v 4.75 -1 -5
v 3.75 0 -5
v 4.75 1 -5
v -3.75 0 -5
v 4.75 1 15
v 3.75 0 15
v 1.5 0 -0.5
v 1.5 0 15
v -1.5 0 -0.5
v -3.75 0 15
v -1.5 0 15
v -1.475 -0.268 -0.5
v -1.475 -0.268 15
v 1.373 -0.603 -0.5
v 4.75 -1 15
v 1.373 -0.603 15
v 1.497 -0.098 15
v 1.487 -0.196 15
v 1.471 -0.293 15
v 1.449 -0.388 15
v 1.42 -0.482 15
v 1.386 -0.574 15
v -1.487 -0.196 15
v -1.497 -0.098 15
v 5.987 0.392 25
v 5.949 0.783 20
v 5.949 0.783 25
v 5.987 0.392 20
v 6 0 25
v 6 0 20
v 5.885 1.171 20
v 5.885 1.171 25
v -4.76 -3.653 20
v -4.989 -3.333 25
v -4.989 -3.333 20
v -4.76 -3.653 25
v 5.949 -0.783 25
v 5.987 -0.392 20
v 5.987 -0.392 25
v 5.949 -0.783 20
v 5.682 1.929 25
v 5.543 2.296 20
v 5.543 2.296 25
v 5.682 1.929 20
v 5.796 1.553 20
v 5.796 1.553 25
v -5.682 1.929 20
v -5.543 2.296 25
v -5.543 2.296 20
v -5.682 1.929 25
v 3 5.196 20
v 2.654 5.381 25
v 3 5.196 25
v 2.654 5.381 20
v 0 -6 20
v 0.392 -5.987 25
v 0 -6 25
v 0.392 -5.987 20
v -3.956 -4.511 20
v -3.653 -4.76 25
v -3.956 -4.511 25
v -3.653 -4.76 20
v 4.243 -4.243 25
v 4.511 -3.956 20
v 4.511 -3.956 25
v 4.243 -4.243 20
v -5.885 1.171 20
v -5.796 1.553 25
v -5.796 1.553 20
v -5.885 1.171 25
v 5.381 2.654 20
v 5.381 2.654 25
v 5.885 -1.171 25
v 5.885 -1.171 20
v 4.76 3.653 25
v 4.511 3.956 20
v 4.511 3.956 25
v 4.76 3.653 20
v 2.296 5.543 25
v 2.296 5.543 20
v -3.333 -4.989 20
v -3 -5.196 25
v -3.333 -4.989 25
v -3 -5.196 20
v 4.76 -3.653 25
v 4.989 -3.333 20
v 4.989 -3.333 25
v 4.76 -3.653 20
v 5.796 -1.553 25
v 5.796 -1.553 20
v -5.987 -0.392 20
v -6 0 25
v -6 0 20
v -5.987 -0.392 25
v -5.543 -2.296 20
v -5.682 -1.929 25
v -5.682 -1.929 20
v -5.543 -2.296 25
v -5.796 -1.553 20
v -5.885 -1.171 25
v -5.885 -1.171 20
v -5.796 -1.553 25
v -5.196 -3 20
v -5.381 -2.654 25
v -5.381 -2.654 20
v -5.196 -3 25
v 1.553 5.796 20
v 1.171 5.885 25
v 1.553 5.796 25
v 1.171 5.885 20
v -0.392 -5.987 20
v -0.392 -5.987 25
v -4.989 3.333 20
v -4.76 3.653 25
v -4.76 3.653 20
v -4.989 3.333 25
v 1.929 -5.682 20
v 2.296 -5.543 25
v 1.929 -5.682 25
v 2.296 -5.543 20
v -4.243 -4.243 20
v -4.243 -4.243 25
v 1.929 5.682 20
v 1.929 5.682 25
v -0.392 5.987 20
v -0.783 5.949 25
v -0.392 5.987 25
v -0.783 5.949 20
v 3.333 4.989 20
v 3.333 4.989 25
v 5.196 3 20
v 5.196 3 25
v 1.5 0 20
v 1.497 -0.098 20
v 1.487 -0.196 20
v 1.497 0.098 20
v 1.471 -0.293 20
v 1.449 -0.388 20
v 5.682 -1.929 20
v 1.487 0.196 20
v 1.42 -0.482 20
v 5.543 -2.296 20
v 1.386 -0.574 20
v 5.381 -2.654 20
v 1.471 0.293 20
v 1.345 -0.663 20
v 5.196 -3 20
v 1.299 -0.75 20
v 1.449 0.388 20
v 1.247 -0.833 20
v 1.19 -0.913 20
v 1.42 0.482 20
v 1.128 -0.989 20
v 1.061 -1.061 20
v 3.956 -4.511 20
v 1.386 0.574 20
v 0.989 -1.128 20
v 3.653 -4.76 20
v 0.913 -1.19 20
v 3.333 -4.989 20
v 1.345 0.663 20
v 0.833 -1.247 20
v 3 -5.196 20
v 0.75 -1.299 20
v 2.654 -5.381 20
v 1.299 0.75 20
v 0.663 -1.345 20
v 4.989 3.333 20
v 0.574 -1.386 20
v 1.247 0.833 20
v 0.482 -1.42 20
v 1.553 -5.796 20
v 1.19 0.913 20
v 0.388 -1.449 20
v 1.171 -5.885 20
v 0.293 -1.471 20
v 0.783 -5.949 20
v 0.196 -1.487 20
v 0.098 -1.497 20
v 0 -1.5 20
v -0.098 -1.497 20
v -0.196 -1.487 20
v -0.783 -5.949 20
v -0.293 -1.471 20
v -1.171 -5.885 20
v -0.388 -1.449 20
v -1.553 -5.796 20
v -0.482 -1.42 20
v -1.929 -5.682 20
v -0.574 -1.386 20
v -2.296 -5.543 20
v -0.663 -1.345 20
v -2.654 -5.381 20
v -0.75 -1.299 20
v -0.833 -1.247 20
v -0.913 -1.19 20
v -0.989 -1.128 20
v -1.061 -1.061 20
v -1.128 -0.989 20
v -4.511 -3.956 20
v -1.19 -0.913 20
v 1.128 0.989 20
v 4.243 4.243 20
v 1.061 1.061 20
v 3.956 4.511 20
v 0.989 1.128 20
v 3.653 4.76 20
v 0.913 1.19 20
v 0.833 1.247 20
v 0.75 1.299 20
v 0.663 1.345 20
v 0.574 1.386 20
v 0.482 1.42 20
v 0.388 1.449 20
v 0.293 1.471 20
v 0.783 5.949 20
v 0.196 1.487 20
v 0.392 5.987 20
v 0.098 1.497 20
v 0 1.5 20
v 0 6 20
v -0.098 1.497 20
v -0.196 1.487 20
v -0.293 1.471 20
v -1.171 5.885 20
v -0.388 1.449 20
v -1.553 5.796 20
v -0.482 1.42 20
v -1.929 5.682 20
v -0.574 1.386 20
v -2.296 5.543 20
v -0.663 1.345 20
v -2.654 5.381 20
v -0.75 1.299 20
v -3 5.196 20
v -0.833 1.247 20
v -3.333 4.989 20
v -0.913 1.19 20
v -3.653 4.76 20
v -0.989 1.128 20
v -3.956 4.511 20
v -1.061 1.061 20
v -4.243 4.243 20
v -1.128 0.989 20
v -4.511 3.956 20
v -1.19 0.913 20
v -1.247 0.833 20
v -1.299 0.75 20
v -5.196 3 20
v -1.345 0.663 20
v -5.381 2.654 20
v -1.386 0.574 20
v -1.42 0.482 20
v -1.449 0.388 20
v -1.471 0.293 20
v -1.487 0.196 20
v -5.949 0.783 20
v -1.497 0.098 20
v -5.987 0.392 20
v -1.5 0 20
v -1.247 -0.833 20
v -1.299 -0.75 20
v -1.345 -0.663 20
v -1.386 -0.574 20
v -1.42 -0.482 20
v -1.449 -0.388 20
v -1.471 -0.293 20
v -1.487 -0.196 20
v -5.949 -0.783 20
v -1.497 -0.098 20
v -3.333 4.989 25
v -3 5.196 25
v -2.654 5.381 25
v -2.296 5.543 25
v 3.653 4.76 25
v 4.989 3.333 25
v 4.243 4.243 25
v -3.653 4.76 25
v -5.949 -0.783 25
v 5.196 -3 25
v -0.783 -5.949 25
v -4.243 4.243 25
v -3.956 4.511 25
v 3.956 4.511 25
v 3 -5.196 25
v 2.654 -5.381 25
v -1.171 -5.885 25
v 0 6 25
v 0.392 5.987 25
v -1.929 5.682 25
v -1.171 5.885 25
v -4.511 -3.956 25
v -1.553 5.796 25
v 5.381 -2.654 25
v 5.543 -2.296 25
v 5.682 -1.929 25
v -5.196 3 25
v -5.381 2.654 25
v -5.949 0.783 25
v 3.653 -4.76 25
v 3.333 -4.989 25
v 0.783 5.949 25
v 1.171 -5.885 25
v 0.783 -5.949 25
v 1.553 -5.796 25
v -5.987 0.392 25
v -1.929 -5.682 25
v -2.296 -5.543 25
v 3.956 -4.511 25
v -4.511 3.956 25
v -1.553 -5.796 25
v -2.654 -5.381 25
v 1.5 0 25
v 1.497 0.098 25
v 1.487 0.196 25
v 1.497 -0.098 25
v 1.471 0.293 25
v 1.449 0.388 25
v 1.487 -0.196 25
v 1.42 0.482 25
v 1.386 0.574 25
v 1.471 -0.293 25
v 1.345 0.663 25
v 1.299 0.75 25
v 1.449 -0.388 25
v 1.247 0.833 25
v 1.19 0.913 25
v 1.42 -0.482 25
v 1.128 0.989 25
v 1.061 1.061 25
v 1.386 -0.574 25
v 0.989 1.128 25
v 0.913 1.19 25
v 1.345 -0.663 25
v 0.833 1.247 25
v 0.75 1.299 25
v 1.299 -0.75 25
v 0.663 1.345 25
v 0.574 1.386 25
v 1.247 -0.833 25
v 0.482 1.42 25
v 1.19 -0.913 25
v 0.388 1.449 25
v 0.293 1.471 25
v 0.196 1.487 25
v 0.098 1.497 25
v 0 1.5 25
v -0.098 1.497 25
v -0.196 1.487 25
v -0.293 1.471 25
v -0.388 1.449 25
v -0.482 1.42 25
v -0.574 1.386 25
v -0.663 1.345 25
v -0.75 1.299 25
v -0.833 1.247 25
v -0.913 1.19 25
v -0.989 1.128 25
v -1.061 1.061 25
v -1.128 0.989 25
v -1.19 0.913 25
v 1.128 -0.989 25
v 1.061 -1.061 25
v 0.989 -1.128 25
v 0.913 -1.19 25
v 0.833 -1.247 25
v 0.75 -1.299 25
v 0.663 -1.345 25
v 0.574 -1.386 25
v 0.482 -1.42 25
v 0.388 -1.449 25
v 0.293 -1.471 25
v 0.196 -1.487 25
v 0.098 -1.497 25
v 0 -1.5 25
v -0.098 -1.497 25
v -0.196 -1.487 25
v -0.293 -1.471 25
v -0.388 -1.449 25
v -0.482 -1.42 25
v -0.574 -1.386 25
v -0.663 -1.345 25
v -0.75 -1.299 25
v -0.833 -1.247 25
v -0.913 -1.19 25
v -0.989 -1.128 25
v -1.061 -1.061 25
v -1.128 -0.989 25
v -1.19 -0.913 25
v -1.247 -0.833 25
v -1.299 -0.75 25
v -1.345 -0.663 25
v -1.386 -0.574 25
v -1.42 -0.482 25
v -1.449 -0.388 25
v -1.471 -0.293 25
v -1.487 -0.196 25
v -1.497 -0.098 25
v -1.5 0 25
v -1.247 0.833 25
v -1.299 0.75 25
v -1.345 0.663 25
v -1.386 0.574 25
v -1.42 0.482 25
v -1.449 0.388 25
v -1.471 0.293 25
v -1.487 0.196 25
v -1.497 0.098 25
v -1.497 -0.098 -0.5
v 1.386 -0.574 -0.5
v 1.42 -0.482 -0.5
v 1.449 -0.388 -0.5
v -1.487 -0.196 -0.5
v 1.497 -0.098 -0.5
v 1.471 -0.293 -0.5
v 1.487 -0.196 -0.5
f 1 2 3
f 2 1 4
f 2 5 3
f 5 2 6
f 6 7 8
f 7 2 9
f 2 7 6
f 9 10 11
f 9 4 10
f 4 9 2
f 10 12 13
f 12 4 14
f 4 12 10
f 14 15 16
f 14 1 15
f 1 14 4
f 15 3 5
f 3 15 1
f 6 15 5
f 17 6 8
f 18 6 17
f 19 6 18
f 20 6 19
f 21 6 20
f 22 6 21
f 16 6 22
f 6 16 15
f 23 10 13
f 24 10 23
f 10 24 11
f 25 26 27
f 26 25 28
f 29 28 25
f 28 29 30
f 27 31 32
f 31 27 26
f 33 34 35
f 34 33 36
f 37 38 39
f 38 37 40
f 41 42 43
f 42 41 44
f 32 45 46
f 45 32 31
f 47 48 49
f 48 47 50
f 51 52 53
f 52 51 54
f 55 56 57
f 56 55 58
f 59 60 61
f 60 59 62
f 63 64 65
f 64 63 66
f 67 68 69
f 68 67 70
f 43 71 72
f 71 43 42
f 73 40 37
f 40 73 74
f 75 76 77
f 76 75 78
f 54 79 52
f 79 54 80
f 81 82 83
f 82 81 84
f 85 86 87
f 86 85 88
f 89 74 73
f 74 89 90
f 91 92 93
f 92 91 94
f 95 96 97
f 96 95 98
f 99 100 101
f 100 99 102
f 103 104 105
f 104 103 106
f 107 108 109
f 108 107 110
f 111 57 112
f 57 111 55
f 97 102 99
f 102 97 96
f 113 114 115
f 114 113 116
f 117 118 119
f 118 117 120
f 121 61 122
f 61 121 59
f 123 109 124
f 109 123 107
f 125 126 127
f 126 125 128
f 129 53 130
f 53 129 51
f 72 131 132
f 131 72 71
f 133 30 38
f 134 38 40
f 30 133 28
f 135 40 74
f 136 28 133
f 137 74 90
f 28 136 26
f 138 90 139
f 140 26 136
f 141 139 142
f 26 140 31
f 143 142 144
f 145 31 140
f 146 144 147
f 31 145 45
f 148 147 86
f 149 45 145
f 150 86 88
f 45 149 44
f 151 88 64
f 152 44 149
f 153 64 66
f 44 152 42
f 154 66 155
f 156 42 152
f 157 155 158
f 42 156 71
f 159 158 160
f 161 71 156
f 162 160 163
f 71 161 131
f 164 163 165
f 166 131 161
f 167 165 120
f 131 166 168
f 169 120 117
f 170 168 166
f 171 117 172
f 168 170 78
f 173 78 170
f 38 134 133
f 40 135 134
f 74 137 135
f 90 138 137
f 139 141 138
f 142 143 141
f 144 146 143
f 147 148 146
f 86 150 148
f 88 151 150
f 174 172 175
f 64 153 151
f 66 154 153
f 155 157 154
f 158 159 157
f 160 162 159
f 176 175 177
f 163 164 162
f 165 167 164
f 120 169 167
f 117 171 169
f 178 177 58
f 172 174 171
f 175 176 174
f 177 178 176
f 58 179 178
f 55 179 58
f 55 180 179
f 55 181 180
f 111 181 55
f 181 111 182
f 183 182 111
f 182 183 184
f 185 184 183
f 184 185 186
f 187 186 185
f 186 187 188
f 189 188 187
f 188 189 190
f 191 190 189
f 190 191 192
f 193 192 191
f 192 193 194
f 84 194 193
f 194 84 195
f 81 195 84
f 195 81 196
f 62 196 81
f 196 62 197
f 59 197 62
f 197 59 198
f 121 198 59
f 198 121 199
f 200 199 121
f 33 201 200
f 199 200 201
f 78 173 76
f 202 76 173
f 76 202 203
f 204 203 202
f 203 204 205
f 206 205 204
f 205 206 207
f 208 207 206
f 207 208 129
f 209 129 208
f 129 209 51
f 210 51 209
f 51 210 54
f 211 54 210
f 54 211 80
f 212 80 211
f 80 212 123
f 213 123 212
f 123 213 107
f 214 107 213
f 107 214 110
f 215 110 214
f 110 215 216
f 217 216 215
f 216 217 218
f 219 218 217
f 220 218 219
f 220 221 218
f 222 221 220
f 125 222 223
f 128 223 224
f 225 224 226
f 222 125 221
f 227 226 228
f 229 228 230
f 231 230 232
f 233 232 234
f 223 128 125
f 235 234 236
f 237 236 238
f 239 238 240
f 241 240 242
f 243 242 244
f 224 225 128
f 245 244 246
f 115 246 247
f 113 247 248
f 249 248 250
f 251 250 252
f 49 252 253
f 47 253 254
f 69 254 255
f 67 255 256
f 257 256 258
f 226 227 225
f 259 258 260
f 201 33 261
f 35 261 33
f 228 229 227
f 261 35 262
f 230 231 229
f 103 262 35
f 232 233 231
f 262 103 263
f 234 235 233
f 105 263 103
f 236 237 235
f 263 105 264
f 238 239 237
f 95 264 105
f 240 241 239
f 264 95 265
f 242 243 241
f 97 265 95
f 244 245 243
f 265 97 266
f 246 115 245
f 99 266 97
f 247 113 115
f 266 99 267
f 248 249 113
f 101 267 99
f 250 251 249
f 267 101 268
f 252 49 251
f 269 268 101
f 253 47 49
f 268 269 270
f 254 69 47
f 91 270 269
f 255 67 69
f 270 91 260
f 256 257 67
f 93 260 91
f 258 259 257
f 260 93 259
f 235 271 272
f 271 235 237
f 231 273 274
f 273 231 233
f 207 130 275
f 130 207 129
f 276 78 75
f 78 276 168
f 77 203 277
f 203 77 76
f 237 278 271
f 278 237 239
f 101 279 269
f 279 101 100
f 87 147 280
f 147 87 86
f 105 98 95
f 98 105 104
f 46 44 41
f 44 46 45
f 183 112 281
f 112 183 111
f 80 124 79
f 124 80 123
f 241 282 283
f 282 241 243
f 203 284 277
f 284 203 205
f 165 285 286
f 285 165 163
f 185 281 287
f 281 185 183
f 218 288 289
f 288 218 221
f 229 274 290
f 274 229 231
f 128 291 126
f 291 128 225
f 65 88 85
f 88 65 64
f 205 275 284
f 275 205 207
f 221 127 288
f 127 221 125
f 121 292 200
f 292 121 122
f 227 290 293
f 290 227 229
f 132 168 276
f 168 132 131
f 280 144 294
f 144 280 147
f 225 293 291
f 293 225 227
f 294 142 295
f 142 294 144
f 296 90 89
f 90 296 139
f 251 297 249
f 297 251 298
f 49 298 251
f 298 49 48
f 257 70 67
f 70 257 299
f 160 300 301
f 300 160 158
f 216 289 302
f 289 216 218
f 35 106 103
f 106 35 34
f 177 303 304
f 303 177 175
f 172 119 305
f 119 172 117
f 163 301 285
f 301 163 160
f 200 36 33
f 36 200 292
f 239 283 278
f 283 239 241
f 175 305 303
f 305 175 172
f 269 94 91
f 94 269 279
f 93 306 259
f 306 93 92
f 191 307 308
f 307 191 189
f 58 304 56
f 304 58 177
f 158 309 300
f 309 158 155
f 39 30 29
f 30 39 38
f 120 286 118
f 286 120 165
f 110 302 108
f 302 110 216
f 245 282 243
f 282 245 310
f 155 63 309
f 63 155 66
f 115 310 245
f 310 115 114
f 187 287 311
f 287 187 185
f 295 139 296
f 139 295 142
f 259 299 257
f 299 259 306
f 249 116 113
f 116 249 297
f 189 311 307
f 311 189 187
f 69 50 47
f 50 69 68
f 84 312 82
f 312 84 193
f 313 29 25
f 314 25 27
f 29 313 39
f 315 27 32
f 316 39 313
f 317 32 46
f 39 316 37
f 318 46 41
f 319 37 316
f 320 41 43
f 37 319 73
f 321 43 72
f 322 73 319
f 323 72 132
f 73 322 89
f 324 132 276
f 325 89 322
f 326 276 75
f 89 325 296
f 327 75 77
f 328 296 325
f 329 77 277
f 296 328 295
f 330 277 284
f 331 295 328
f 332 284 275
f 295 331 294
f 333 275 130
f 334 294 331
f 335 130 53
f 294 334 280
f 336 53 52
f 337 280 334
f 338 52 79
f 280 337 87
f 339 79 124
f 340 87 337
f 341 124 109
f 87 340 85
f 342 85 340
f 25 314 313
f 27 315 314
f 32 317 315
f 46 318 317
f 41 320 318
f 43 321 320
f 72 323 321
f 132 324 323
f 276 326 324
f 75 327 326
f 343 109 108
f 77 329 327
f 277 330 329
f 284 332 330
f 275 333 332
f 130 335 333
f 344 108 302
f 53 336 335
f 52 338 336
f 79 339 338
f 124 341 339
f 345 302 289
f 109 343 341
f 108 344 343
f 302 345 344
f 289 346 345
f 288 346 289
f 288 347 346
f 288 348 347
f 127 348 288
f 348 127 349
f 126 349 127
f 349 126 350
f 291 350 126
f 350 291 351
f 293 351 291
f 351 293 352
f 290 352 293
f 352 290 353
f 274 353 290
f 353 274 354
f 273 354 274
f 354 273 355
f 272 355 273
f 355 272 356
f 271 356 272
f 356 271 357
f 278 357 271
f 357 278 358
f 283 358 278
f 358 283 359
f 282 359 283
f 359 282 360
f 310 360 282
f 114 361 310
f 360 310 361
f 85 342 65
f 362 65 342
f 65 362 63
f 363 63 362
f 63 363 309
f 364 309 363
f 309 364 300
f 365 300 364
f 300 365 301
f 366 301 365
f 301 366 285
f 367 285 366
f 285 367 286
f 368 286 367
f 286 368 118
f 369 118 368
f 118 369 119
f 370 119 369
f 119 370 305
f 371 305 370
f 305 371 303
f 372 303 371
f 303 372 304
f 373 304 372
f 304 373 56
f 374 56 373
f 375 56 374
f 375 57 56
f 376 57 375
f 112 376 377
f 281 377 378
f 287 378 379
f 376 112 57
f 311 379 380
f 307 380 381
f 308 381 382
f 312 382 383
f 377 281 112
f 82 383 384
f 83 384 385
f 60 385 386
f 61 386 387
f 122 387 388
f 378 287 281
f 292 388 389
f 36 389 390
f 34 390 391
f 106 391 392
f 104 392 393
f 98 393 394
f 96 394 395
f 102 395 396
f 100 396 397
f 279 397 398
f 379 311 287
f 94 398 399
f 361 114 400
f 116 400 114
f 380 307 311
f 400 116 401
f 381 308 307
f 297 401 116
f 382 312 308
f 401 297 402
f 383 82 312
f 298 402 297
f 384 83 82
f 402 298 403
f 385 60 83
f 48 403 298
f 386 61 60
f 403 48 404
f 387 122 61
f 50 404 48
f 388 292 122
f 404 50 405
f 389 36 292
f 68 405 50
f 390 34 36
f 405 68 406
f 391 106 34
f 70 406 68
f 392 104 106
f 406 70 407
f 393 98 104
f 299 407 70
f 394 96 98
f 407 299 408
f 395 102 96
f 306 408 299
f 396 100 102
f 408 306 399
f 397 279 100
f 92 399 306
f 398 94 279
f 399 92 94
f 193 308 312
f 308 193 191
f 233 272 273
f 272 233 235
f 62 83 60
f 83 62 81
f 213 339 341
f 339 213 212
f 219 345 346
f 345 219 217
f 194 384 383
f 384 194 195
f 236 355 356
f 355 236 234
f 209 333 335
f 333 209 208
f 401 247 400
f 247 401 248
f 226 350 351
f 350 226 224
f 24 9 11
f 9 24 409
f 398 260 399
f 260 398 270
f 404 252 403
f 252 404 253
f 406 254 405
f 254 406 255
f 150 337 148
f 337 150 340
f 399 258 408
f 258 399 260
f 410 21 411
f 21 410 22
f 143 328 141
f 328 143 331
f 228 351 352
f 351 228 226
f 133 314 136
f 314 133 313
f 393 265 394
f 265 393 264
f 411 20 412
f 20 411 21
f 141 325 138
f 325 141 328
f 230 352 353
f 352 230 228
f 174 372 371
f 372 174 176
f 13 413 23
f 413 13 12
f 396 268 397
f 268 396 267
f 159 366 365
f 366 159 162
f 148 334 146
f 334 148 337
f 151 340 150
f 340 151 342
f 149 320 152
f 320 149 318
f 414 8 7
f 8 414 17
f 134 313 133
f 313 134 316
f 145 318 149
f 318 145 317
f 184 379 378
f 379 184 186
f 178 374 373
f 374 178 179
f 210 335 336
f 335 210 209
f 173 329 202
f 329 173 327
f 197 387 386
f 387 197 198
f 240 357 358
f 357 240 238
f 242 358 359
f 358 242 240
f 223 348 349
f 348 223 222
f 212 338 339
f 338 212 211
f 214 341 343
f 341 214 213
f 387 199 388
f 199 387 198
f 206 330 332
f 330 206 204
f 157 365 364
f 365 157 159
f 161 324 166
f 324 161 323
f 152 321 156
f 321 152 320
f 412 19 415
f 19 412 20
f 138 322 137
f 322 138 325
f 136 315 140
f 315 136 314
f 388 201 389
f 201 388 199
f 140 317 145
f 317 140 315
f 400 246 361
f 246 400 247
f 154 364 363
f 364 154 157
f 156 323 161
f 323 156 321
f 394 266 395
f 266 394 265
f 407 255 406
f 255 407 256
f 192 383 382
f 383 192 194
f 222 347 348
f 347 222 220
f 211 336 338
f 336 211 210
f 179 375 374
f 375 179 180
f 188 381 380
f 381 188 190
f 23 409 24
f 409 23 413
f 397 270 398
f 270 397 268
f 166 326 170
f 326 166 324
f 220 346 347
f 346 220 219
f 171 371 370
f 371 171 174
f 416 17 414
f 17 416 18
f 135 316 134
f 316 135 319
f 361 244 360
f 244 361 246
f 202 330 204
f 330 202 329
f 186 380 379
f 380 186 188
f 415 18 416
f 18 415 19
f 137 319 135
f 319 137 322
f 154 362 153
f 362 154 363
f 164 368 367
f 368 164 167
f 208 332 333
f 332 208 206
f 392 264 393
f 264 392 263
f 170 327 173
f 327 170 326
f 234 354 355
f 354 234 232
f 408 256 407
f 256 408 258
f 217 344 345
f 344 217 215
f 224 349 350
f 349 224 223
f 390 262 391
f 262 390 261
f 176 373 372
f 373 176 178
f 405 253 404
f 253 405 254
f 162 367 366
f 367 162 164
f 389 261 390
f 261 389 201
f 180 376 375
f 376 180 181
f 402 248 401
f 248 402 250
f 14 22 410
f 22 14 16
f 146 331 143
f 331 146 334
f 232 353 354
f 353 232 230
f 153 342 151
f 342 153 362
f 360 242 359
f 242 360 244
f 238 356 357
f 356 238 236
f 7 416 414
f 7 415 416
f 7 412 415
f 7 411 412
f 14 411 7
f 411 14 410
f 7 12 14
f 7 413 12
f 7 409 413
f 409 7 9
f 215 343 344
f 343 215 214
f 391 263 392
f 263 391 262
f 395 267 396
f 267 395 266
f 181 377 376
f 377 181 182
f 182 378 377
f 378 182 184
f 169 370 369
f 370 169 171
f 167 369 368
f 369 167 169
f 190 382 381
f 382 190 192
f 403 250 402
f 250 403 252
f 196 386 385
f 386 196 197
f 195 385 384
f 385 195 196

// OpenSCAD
// Hose-barb reducer: joins 8 mm and 5 mm silicone tubing
// Print orientation: standing upright along +Z

// ---------- Parameters ----------
t8_d      = 8;     // 8 mm tubing inner diameter
t5_d      = 5;     // 5 mm tubing inner diameter
bore_d    = 3;     // through-bore diameter
z0        = 0;     // start of 8 mm section
z1        = 20;    // start of collar
z2        = 25;    // start of 5 mm section
z3        = 41;    // end of part
barb_h8   = 10;    // 8 mm barb height
barb_h5   = 8;     // 5 mm barb height
od8_bot   = 7.5;   // 8 mm barb outer diameter at bottom
od8_top   = 9.5;   // 8 mm barb outer diameter at top
od5_bot   = 6.5;   // 5 mm barb outer diameter at bottom
od5_top   = 5.0;   // 5 mm barb outer diameter at top
collar_d  = 12;    // collar diameter
eps       = 0.5;   // cutter overshoot

$fn = 96;

// ---------- Model ----------
difference() {
    union() {
        // 8 mm section: two stacked sawtooth barbs
        for (s = [-1, 1])
            translate([0, 0, z0 + s * barb_h8 / 2])
                linear_extrude(height = barb_h8)
                    polygon([[-od8_bot / 2, 0], [od8_bot / 2, 0],
                             [od8_top / 2, (od8_top - od8_bot) / 2],
                             [od8_top / 2, -(od8_top - od8_bot) / 2]]);
        // collar
        translate([0, 0, z1])
            cylinder(d = collar_d, h = z2 - z1);
        // 5 mm section: two stacked sawtooth barbs
        for (s = [-1, 1])
            translate([0, 0, z2 + s * barb_h5 / 2])
                linear_extrude(height = barb_h5)
                    polygon([[-od5_bot / 2, 0], [od5_bot / 2, 0],
                             [od5_top / 2, (od5_top - od5_bot) / 2],
                             [od5_top / 2, -(od5_top - od5_bot) / 2]]);
    }
    // through-bore
    translate([0, 0, -eps])
        cylinder(d = bore_d, h = z3 - z0 + 2 * eps);
}
